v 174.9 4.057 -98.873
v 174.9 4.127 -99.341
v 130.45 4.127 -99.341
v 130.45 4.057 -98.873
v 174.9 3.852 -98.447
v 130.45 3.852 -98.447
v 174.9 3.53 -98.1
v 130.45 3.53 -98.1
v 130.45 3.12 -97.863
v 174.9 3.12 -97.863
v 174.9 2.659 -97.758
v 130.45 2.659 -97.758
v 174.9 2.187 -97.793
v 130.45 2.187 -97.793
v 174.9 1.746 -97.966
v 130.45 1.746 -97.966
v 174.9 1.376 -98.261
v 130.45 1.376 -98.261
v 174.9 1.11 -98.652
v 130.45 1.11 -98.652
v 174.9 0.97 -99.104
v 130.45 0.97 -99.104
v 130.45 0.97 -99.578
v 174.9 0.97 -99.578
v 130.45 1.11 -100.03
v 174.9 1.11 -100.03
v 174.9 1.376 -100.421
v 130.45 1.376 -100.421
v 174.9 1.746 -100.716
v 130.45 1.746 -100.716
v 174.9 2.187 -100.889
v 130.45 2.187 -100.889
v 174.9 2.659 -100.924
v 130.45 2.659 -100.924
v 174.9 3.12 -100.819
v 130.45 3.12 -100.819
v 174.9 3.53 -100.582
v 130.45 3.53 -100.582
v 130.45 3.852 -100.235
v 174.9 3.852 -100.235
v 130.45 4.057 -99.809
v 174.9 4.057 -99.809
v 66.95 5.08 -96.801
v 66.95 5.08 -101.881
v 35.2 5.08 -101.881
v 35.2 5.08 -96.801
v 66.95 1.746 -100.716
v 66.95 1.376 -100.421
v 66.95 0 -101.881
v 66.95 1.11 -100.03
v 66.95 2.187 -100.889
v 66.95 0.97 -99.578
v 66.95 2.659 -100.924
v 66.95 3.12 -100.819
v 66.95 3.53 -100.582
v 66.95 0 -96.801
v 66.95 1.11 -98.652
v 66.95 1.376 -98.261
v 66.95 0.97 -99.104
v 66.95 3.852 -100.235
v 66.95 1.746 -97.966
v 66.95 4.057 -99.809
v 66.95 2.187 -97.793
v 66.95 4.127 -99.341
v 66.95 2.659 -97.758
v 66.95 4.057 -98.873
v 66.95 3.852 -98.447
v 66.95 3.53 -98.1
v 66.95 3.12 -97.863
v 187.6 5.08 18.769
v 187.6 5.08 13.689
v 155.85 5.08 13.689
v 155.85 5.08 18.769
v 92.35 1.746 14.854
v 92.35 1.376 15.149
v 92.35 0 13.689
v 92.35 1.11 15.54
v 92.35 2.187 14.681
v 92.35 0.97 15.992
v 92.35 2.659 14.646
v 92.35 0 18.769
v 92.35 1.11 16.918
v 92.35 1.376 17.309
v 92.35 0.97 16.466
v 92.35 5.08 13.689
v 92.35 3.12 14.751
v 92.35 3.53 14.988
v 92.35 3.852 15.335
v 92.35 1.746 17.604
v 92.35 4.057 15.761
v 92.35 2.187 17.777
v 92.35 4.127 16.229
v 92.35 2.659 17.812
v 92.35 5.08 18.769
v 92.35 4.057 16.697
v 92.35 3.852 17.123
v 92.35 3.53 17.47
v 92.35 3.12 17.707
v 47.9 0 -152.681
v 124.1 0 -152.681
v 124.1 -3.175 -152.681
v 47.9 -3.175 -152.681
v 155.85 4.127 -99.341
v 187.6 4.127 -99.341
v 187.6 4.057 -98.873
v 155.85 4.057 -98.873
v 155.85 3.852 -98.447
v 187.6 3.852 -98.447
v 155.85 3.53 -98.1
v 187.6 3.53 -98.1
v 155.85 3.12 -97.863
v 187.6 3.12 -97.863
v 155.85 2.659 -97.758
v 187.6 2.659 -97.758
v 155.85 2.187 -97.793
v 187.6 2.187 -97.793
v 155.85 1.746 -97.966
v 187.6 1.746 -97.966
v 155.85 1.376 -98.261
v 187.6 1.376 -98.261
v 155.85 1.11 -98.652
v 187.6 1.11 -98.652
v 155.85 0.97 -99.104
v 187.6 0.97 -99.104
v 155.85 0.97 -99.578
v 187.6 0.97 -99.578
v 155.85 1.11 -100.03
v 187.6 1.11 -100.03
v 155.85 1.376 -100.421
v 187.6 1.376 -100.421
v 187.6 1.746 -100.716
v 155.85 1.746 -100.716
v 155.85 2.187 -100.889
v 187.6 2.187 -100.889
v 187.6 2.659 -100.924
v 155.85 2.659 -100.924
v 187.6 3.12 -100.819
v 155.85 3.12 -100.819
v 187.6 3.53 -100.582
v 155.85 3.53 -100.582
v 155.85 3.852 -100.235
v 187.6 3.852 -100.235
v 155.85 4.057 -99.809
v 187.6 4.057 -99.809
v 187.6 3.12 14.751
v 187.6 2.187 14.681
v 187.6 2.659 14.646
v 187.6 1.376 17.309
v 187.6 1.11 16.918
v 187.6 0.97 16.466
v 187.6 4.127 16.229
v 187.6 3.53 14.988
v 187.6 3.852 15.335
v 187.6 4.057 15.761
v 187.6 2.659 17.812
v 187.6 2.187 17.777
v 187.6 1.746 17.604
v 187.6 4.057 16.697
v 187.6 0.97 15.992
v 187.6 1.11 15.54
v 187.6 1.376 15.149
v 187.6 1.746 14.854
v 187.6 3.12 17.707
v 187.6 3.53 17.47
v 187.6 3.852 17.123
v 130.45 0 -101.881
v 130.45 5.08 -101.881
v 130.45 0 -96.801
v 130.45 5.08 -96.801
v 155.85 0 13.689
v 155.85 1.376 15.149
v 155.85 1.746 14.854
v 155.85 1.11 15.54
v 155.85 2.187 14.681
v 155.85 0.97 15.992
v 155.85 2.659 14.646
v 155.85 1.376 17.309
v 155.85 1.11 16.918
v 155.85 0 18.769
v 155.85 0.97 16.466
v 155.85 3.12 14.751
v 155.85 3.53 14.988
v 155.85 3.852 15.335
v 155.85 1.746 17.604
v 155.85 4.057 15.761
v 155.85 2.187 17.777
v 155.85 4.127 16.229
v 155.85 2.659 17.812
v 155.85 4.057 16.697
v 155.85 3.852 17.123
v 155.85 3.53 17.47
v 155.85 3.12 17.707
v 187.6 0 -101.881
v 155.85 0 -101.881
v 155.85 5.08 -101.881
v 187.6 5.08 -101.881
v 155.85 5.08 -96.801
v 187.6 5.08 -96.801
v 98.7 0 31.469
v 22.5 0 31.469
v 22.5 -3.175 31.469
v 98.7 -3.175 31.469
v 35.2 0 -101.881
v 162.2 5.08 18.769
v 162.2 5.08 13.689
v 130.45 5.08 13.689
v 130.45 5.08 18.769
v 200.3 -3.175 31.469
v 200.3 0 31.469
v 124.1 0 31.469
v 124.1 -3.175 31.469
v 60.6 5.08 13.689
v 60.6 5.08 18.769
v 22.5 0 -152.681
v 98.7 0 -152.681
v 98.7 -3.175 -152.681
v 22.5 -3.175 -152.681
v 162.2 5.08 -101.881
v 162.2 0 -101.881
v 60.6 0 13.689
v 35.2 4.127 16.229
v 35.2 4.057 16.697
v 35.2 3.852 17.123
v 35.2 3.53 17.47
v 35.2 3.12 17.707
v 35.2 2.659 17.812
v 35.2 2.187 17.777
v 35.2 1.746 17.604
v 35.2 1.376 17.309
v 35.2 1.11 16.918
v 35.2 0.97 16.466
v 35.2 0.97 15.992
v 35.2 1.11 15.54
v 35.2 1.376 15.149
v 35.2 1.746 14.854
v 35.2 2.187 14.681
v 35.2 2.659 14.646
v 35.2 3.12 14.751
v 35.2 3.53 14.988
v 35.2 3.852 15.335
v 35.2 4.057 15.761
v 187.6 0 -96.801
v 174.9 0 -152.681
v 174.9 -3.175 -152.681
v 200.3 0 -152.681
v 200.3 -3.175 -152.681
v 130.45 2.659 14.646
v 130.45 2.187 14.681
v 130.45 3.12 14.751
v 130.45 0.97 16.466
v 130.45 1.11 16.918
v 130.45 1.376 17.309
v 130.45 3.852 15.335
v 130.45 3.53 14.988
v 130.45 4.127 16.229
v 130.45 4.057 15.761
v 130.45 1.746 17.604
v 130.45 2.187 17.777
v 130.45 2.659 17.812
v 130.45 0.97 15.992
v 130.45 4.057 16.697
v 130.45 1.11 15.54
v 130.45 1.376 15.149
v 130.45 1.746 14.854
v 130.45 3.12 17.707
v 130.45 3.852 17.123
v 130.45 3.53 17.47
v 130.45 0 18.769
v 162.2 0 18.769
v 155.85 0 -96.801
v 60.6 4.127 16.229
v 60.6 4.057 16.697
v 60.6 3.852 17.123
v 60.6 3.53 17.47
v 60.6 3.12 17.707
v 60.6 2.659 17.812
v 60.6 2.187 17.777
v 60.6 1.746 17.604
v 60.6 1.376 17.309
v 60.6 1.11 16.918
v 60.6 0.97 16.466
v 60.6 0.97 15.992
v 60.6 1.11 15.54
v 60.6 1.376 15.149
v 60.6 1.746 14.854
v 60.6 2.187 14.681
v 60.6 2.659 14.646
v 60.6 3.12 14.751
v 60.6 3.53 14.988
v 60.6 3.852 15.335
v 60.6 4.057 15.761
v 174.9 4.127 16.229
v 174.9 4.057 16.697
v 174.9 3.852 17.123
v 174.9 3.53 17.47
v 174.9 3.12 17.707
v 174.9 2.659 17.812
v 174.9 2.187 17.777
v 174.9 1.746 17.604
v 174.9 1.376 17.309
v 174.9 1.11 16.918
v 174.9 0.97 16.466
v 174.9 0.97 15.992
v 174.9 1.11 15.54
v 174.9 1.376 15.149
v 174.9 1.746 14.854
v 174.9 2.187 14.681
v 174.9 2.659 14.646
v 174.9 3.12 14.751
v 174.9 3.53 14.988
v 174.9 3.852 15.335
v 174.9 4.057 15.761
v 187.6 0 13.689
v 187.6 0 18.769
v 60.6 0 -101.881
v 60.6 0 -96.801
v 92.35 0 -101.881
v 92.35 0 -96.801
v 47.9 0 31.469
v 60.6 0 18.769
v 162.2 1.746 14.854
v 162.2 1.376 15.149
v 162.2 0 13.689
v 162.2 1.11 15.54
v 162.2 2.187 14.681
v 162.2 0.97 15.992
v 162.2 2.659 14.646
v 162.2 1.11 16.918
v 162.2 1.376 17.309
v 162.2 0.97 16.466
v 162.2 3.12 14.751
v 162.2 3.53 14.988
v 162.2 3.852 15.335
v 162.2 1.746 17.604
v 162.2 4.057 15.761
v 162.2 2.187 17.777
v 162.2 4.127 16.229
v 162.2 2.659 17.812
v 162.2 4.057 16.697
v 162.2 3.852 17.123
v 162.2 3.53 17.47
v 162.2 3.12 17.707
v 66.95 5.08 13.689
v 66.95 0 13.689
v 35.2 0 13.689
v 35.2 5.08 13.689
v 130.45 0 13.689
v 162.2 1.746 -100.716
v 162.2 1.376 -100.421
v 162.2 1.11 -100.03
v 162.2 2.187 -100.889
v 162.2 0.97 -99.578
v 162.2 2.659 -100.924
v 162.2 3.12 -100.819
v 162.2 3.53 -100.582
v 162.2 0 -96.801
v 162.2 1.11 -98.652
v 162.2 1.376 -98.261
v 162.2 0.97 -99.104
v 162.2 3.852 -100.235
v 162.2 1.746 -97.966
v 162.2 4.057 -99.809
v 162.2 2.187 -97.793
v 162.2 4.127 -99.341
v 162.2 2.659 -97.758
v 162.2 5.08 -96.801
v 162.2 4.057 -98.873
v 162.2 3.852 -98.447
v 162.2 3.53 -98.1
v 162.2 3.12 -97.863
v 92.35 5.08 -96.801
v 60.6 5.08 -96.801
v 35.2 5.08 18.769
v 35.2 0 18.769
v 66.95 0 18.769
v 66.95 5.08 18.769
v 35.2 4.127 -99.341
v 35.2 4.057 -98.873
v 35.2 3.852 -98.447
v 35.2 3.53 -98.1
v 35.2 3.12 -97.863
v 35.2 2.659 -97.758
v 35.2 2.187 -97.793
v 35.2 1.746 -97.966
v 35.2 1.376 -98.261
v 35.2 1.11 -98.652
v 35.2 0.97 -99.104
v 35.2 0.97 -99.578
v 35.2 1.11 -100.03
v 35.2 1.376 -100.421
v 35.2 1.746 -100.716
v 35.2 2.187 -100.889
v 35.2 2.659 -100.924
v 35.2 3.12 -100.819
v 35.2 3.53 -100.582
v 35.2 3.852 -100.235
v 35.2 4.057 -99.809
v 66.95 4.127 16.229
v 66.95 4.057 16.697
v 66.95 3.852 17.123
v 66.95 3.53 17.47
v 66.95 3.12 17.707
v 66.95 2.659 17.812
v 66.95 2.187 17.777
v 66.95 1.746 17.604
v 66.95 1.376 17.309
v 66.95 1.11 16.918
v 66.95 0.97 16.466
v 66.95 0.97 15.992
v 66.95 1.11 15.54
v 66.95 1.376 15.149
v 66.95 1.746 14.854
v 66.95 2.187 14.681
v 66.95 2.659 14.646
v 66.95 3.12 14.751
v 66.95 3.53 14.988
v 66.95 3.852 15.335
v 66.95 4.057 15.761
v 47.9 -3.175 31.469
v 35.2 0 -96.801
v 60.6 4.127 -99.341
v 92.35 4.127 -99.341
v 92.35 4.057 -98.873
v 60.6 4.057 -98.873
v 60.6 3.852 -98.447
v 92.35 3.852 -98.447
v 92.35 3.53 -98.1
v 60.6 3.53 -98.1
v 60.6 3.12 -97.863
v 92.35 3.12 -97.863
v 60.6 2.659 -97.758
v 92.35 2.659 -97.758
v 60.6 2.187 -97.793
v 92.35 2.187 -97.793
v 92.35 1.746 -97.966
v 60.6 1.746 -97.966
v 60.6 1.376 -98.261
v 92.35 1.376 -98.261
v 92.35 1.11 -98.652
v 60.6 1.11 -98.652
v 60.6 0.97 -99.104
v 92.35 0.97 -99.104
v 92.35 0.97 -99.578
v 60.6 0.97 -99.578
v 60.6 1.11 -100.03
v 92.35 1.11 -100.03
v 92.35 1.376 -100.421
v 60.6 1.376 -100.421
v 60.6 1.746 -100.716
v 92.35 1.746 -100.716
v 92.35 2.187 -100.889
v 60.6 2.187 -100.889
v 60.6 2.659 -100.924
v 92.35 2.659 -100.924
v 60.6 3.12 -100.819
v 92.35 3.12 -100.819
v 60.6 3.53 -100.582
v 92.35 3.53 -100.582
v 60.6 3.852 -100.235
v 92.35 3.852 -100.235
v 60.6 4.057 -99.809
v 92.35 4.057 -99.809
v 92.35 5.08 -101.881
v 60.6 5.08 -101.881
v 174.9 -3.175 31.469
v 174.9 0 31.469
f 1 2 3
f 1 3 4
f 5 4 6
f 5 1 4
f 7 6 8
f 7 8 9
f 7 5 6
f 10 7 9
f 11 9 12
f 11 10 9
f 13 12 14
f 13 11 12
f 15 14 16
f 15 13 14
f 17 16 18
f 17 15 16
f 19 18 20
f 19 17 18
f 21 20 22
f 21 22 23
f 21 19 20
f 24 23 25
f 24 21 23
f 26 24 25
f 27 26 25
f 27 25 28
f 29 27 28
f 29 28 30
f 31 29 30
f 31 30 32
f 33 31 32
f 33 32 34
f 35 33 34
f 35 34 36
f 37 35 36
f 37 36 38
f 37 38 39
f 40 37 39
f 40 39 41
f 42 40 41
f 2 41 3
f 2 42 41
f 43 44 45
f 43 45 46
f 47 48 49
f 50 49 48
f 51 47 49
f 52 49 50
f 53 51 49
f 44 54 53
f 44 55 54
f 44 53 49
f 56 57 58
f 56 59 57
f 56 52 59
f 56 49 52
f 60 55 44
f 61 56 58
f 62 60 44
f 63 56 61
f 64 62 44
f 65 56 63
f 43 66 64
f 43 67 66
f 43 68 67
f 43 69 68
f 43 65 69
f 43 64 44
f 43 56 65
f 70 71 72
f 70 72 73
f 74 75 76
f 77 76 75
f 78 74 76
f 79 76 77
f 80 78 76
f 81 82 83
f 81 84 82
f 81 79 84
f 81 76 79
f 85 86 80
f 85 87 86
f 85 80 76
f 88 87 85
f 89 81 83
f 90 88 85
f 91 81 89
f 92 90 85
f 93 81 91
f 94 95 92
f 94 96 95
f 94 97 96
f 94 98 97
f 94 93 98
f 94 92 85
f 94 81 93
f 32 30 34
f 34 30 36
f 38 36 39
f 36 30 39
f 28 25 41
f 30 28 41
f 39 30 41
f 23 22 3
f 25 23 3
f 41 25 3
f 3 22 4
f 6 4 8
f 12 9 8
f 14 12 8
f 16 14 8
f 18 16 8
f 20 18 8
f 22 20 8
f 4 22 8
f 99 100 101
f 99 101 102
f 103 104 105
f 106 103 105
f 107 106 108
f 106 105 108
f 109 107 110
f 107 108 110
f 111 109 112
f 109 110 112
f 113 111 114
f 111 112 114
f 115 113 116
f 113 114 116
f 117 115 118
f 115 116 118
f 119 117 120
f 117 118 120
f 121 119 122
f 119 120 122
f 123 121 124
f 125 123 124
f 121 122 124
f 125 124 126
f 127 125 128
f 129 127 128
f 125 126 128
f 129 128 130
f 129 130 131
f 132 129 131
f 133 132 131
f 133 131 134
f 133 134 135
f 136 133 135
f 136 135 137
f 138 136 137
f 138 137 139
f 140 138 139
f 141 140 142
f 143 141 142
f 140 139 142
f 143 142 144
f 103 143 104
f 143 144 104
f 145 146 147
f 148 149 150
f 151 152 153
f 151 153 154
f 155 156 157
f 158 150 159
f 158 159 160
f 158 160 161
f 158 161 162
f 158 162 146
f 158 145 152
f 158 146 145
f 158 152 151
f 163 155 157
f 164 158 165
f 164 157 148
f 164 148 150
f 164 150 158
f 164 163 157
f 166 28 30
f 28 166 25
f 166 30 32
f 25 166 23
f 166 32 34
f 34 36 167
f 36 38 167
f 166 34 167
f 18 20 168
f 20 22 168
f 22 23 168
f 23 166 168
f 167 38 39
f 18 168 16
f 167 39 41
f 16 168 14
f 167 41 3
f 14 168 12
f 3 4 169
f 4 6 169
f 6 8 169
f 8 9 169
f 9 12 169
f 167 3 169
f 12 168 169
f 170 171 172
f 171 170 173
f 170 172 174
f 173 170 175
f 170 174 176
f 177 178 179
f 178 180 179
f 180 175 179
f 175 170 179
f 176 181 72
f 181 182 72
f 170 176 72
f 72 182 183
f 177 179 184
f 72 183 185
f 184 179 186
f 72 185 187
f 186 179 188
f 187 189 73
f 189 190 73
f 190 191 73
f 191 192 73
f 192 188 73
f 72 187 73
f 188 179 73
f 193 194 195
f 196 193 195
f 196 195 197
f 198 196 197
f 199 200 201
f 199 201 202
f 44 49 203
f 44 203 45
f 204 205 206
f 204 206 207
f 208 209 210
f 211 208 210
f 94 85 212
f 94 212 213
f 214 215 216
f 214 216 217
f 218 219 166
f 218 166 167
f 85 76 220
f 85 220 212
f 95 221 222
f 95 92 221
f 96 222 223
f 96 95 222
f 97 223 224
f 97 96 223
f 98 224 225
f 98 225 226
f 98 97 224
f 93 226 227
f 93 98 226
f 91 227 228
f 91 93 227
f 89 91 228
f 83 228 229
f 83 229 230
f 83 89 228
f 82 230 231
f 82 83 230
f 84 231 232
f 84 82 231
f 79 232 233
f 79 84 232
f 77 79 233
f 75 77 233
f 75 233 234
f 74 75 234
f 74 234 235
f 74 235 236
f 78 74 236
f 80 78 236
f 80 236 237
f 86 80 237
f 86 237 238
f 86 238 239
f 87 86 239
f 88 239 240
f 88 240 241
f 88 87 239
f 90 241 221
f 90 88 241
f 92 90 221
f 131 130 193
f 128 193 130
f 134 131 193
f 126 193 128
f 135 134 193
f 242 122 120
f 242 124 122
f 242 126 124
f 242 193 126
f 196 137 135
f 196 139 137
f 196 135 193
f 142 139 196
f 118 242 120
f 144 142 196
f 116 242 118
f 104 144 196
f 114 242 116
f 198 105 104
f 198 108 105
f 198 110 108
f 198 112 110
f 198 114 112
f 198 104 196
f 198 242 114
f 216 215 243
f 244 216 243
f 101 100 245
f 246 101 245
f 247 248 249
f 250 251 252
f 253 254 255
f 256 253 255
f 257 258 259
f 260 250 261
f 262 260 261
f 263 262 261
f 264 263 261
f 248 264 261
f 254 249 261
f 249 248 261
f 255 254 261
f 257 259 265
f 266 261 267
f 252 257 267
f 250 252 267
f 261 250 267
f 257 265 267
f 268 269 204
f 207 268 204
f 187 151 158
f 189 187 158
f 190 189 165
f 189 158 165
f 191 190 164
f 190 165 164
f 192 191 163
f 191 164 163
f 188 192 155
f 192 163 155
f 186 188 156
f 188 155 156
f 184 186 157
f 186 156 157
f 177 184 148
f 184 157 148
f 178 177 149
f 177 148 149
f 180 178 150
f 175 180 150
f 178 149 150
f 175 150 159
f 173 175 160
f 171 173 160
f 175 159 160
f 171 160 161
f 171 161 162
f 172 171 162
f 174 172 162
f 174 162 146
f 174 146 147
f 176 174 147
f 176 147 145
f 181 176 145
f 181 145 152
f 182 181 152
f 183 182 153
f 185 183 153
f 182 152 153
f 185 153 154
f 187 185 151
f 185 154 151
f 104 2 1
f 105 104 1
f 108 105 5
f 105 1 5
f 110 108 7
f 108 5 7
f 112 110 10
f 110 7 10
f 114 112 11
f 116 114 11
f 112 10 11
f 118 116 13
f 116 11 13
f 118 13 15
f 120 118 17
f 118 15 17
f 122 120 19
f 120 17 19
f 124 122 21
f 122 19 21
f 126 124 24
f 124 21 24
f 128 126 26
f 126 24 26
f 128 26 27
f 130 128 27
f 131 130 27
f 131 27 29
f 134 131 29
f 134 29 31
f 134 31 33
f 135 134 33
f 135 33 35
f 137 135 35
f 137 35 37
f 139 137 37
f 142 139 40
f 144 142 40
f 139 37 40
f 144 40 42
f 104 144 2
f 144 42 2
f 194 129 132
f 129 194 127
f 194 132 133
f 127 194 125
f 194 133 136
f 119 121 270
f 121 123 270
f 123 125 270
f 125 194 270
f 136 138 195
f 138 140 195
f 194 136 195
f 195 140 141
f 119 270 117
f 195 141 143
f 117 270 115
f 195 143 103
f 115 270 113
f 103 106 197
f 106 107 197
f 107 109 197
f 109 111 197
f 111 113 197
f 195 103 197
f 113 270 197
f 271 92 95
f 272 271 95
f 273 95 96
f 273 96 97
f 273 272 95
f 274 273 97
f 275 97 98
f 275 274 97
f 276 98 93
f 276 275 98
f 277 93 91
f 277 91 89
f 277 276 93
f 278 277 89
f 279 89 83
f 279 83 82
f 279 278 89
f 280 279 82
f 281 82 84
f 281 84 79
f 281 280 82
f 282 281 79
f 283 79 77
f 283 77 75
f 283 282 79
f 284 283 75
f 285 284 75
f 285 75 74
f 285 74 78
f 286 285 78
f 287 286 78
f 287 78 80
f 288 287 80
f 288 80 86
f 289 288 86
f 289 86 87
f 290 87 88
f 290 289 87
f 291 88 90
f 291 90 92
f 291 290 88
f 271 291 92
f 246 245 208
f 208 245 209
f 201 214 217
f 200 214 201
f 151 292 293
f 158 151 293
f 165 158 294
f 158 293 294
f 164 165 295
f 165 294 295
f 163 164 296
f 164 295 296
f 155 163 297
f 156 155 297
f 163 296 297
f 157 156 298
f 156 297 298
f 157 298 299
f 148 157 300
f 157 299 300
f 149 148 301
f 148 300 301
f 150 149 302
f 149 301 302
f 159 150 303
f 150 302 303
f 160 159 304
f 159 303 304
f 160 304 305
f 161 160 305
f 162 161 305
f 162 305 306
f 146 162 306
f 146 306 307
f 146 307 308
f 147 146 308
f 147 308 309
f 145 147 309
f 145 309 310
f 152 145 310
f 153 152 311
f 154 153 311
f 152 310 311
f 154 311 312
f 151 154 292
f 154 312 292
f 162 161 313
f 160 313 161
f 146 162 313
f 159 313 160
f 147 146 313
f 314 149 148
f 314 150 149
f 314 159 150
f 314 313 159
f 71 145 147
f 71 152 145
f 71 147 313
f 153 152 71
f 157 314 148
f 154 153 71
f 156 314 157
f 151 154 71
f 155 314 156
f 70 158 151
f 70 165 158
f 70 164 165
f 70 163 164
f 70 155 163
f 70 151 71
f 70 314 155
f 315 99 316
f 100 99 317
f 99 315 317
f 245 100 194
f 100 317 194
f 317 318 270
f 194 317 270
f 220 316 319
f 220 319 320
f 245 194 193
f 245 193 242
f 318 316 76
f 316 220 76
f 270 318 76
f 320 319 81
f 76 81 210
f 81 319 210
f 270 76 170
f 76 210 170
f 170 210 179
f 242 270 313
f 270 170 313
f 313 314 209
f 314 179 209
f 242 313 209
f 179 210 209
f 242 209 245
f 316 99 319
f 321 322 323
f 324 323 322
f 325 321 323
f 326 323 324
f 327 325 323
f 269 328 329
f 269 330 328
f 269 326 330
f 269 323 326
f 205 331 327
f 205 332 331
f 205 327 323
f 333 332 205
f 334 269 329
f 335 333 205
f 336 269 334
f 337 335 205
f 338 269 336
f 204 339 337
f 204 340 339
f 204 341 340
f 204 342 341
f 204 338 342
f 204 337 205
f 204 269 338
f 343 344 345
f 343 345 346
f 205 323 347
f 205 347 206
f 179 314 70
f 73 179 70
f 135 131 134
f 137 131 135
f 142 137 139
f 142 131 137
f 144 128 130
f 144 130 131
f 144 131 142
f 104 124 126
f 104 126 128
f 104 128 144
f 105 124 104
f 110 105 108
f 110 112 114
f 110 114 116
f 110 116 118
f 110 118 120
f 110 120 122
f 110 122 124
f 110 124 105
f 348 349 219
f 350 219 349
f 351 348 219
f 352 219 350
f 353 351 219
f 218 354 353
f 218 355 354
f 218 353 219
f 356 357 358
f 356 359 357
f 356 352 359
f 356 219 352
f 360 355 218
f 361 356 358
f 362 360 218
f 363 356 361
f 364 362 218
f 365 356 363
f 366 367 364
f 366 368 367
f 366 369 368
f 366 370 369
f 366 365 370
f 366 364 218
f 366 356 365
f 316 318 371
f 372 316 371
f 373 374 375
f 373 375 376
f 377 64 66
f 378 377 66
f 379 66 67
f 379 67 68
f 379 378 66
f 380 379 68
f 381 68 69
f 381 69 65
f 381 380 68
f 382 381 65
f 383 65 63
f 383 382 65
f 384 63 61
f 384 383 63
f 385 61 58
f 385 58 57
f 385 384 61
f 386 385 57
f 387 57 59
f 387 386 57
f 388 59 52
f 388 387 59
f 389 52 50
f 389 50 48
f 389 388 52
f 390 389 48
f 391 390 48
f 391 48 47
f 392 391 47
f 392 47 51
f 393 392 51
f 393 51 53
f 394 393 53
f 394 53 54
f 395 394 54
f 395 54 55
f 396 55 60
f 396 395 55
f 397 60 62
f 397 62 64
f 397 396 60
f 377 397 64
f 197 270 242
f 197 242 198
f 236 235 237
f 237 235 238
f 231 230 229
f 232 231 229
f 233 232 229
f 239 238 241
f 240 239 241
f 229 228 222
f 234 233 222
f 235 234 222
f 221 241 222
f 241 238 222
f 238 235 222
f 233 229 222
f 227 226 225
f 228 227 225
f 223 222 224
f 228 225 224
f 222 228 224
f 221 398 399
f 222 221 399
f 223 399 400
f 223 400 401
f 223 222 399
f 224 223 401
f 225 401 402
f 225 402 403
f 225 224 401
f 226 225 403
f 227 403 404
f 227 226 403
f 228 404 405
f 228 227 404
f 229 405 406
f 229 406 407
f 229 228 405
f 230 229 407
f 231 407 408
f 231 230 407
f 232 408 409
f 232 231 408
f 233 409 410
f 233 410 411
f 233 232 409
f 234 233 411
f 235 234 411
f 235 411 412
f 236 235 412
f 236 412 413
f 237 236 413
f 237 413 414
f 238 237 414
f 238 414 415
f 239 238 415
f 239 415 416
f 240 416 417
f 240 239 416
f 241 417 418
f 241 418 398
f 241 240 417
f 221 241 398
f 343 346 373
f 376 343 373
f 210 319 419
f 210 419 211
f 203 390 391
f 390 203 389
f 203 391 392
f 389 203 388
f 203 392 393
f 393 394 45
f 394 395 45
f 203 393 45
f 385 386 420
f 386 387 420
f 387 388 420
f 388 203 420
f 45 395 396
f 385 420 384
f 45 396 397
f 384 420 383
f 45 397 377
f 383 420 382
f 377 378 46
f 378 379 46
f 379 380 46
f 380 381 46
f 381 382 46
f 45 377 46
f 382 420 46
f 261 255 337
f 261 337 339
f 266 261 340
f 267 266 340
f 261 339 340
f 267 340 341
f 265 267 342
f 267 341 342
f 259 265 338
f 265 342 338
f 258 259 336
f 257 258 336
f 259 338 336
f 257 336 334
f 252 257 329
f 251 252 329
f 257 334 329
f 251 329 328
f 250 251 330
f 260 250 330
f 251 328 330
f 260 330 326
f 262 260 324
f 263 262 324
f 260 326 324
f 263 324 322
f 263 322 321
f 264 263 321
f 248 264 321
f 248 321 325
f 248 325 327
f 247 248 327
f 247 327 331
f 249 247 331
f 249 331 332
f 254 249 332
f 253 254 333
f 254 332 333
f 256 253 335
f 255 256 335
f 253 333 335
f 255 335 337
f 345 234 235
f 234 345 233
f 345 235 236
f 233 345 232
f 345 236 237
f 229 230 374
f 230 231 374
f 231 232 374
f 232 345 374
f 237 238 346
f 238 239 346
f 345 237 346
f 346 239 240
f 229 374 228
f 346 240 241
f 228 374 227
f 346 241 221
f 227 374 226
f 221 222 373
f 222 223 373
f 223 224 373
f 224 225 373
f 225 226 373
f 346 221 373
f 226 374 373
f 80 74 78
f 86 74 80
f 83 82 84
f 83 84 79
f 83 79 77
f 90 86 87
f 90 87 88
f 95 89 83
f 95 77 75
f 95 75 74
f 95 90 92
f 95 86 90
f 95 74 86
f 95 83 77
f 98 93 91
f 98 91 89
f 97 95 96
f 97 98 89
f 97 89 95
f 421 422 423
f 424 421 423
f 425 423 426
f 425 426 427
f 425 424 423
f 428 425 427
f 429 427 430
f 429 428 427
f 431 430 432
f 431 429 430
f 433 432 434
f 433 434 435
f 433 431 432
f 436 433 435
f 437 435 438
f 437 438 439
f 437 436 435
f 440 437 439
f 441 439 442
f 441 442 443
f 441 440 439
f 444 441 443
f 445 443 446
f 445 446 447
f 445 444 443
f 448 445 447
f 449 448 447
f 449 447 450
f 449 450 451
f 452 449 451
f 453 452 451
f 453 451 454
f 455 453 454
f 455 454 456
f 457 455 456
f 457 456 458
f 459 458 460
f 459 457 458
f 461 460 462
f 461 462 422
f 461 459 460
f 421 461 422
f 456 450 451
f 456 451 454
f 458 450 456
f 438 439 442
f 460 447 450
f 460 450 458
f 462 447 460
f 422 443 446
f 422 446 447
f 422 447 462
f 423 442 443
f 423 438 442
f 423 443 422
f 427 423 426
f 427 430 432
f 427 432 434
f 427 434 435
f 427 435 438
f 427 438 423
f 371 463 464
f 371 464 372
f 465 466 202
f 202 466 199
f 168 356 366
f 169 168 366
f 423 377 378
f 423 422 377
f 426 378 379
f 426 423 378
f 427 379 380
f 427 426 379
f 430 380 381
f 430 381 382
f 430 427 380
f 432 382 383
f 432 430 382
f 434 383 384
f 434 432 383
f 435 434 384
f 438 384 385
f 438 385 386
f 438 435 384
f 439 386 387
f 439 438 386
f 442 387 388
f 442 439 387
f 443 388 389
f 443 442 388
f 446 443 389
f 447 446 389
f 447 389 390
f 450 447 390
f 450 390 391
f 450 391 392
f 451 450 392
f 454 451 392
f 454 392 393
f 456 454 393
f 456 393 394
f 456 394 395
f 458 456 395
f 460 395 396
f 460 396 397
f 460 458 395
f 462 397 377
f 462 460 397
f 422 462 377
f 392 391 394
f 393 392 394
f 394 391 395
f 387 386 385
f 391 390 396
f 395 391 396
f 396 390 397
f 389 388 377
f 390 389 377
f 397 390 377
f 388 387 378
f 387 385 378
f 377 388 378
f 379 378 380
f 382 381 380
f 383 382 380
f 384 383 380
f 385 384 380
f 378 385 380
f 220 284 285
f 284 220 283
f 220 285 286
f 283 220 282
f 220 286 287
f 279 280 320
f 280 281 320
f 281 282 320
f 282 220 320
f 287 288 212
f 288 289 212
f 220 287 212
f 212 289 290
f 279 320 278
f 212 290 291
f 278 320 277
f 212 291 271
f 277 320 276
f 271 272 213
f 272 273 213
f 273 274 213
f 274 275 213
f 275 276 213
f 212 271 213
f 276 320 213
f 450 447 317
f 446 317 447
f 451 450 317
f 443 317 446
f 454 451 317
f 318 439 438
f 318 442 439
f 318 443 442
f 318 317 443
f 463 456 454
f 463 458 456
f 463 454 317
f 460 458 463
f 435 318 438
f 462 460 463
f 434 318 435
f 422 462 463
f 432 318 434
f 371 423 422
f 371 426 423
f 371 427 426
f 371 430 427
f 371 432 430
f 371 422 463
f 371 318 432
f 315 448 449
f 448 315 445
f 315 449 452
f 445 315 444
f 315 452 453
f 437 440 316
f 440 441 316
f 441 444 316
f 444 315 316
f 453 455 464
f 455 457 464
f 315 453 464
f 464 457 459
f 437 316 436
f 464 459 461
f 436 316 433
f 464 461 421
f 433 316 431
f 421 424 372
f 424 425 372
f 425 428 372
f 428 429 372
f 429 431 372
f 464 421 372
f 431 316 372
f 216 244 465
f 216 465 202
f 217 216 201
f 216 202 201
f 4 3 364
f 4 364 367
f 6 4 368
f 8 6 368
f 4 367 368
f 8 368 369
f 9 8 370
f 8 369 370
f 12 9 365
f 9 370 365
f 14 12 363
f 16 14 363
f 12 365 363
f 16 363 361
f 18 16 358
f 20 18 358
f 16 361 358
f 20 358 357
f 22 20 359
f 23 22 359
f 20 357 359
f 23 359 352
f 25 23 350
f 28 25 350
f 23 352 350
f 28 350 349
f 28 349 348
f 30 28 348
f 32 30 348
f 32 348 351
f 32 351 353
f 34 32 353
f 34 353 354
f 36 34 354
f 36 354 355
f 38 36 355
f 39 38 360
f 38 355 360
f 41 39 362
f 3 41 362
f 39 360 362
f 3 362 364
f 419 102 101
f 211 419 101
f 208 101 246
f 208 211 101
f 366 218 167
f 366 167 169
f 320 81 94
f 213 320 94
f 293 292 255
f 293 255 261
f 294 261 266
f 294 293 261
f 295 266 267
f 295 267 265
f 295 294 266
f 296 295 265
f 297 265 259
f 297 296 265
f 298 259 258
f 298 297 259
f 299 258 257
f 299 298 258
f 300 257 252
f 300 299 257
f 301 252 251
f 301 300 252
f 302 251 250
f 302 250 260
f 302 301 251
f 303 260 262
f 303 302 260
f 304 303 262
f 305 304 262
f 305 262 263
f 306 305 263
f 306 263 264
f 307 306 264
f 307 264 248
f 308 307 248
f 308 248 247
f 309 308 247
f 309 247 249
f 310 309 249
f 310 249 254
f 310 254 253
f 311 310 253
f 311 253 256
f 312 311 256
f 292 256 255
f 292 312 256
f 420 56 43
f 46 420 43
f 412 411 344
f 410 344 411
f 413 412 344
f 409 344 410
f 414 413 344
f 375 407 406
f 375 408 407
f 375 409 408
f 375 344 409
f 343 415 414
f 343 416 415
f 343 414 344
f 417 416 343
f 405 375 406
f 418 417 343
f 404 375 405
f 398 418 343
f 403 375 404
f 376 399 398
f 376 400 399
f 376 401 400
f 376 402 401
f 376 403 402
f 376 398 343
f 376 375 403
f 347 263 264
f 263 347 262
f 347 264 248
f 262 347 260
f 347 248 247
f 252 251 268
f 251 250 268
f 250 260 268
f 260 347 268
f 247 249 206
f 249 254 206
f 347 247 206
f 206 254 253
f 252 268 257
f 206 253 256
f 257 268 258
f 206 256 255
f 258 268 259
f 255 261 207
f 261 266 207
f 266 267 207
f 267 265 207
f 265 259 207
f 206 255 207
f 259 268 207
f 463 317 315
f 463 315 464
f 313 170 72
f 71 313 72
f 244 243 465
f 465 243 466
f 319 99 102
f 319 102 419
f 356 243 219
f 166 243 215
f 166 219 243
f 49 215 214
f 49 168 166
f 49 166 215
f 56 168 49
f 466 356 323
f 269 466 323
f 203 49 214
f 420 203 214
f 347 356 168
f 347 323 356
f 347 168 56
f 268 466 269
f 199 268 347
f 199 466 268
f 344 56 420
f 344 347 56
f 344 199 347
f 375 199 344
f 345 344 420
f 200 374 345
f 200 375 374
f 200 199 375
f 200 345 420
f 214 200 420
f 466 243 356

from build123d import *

# Parameters (mm, degrees)
F1_DEPTH      = 3.175
F3_START      = -12.7
F2_W          = 5.08
F2_H          = 5.08
F2_R          = 1.5875
F3_DEPTH      = 31.75
F5_DEPTH      = 44.45
F5_DEPTH_BACK = 12.7


# Not quite as in the source:
# - ends of sketch curves that miss each other by under 0.0002 mm in the source are joined
# - a feature names something its author has since deleted; it is built from what else it names


with BuildPart() as f1:
    # F0 (on Front) → F1 (new body)
    with BuildSketch(Plane.XZ):
        Polygon((98.6998776882, -152.6810299752), (128.3797776882, -152.6810299752), (128.3797776882, -78.3310389752), (98.6998768725, -78.3310389752), (98.6998769073, -81.5060299752), (125.2047776882, -81.5060299752), (125.2047776882, -149.5060299752), (98.6998776534, -149.5060299752), align=None)
        Polygon((174.8998776882, -152.6810299752), (174.8998776882, 31.4689700248), (98.6998756677, 31.4689700248), (98.6998768725, -78.3310389752), (128.3797776882, -78.3310389752), (128.3797776882, -152.6810299752), align=None)
        Polygon((125.2047776882, -81.5060299752), (98.6998769073, -81.5060299752), (98.6998776534, -149.5060299752), (125.2047776882, -149.5060299752), align=None)
    extrude(amount=F1_DEPTH)

    # F2 (on face) → F3 (join)
    with BuildSketch(Plane.YZ.offset(174.8998776882).offset(F3_START)):
        with Locations((2.54, 16.2289700248)):
            Rectangle(F2_W, F2_H)
        with Locations((2.54, 16.2289700248)):
            Circle(F2_R, mode=Mode.SUBTRACT)
        with Locations((2.54, -99.3410299752)):
            Rectangle(F2_W, F2_H)
        with Locations((2.54, -99.3410299752)):
            Circle(F2_R, mode=Mode.SUBTRACT)
    extrude(amount=-F3_DEPTH)

    # F4: F1 across face


with BuildPart() as f1_1:
    add(f1.part)
    add(f1.part.mirror(Plane(origin=(98.699876678, -1.5875, -60.6060299752), x_dir=(0, -1, 0), z_dir=(-1, 0, -1.1e-08))))


with BuildPart() as f5:
    # F2 (on face) → F5 (new body, two sides)
    with BuildSketch(Plane.YZ.offset(174.8998776882)) as f5_sk:
        with Locations((2.54, 16.2289700248)):
            Circle(F2_R)
    extrude(amount=-F5_DEPTH)
    extrude(f5_sk.sketch, amount=F5_DEPTH_BACK)


with BuildPart() as f5b:
    # F2 (on face) → F5, piece 2 (new body, two sides)
    with BuildSketch(Plane.YZ.offset(174.8998776882)) as f5_2_sk:
        with Locations((2.54, -99.3410299752)):
            Circle(F2_R)
    extrude(amount=-F5_DEPTH)
    extrude(f5_2_sk.sketch, amount=F5_DEPTH_BACK)


with BuildPart() as f7_1:
    # F7: instance of F1
    add(f1_1.part.mirror(Plane(origin=(111.3998739817, 2.54, 16.2289703035), x_dir=(0, 1, 0), z_dir=(1, 0, 2.19e-08))))


with BuildPart() as f7_2:
    # F7: instance of F5
    add(f5.part.mirror(Plane(origin=(111.3998739817, 2.54, 16.2289703035), x_dir=(0, 1, 0), z_dir=(1, 0, 2.19e-08))))


with BuildPart() as f7_3:
    # F7: instance of F5b
    add(f5b.part.mirror(Plane(origin=(111.3998739817, 2.54, 16.2289703035), x_dir=(0, 1, 0), z_dir=(1, 0, 2.19e-08))))


solid = Compound([f1_1.part, f5.part, f5b.part, f7_1.part, f7_2.part, f7_3.part])
